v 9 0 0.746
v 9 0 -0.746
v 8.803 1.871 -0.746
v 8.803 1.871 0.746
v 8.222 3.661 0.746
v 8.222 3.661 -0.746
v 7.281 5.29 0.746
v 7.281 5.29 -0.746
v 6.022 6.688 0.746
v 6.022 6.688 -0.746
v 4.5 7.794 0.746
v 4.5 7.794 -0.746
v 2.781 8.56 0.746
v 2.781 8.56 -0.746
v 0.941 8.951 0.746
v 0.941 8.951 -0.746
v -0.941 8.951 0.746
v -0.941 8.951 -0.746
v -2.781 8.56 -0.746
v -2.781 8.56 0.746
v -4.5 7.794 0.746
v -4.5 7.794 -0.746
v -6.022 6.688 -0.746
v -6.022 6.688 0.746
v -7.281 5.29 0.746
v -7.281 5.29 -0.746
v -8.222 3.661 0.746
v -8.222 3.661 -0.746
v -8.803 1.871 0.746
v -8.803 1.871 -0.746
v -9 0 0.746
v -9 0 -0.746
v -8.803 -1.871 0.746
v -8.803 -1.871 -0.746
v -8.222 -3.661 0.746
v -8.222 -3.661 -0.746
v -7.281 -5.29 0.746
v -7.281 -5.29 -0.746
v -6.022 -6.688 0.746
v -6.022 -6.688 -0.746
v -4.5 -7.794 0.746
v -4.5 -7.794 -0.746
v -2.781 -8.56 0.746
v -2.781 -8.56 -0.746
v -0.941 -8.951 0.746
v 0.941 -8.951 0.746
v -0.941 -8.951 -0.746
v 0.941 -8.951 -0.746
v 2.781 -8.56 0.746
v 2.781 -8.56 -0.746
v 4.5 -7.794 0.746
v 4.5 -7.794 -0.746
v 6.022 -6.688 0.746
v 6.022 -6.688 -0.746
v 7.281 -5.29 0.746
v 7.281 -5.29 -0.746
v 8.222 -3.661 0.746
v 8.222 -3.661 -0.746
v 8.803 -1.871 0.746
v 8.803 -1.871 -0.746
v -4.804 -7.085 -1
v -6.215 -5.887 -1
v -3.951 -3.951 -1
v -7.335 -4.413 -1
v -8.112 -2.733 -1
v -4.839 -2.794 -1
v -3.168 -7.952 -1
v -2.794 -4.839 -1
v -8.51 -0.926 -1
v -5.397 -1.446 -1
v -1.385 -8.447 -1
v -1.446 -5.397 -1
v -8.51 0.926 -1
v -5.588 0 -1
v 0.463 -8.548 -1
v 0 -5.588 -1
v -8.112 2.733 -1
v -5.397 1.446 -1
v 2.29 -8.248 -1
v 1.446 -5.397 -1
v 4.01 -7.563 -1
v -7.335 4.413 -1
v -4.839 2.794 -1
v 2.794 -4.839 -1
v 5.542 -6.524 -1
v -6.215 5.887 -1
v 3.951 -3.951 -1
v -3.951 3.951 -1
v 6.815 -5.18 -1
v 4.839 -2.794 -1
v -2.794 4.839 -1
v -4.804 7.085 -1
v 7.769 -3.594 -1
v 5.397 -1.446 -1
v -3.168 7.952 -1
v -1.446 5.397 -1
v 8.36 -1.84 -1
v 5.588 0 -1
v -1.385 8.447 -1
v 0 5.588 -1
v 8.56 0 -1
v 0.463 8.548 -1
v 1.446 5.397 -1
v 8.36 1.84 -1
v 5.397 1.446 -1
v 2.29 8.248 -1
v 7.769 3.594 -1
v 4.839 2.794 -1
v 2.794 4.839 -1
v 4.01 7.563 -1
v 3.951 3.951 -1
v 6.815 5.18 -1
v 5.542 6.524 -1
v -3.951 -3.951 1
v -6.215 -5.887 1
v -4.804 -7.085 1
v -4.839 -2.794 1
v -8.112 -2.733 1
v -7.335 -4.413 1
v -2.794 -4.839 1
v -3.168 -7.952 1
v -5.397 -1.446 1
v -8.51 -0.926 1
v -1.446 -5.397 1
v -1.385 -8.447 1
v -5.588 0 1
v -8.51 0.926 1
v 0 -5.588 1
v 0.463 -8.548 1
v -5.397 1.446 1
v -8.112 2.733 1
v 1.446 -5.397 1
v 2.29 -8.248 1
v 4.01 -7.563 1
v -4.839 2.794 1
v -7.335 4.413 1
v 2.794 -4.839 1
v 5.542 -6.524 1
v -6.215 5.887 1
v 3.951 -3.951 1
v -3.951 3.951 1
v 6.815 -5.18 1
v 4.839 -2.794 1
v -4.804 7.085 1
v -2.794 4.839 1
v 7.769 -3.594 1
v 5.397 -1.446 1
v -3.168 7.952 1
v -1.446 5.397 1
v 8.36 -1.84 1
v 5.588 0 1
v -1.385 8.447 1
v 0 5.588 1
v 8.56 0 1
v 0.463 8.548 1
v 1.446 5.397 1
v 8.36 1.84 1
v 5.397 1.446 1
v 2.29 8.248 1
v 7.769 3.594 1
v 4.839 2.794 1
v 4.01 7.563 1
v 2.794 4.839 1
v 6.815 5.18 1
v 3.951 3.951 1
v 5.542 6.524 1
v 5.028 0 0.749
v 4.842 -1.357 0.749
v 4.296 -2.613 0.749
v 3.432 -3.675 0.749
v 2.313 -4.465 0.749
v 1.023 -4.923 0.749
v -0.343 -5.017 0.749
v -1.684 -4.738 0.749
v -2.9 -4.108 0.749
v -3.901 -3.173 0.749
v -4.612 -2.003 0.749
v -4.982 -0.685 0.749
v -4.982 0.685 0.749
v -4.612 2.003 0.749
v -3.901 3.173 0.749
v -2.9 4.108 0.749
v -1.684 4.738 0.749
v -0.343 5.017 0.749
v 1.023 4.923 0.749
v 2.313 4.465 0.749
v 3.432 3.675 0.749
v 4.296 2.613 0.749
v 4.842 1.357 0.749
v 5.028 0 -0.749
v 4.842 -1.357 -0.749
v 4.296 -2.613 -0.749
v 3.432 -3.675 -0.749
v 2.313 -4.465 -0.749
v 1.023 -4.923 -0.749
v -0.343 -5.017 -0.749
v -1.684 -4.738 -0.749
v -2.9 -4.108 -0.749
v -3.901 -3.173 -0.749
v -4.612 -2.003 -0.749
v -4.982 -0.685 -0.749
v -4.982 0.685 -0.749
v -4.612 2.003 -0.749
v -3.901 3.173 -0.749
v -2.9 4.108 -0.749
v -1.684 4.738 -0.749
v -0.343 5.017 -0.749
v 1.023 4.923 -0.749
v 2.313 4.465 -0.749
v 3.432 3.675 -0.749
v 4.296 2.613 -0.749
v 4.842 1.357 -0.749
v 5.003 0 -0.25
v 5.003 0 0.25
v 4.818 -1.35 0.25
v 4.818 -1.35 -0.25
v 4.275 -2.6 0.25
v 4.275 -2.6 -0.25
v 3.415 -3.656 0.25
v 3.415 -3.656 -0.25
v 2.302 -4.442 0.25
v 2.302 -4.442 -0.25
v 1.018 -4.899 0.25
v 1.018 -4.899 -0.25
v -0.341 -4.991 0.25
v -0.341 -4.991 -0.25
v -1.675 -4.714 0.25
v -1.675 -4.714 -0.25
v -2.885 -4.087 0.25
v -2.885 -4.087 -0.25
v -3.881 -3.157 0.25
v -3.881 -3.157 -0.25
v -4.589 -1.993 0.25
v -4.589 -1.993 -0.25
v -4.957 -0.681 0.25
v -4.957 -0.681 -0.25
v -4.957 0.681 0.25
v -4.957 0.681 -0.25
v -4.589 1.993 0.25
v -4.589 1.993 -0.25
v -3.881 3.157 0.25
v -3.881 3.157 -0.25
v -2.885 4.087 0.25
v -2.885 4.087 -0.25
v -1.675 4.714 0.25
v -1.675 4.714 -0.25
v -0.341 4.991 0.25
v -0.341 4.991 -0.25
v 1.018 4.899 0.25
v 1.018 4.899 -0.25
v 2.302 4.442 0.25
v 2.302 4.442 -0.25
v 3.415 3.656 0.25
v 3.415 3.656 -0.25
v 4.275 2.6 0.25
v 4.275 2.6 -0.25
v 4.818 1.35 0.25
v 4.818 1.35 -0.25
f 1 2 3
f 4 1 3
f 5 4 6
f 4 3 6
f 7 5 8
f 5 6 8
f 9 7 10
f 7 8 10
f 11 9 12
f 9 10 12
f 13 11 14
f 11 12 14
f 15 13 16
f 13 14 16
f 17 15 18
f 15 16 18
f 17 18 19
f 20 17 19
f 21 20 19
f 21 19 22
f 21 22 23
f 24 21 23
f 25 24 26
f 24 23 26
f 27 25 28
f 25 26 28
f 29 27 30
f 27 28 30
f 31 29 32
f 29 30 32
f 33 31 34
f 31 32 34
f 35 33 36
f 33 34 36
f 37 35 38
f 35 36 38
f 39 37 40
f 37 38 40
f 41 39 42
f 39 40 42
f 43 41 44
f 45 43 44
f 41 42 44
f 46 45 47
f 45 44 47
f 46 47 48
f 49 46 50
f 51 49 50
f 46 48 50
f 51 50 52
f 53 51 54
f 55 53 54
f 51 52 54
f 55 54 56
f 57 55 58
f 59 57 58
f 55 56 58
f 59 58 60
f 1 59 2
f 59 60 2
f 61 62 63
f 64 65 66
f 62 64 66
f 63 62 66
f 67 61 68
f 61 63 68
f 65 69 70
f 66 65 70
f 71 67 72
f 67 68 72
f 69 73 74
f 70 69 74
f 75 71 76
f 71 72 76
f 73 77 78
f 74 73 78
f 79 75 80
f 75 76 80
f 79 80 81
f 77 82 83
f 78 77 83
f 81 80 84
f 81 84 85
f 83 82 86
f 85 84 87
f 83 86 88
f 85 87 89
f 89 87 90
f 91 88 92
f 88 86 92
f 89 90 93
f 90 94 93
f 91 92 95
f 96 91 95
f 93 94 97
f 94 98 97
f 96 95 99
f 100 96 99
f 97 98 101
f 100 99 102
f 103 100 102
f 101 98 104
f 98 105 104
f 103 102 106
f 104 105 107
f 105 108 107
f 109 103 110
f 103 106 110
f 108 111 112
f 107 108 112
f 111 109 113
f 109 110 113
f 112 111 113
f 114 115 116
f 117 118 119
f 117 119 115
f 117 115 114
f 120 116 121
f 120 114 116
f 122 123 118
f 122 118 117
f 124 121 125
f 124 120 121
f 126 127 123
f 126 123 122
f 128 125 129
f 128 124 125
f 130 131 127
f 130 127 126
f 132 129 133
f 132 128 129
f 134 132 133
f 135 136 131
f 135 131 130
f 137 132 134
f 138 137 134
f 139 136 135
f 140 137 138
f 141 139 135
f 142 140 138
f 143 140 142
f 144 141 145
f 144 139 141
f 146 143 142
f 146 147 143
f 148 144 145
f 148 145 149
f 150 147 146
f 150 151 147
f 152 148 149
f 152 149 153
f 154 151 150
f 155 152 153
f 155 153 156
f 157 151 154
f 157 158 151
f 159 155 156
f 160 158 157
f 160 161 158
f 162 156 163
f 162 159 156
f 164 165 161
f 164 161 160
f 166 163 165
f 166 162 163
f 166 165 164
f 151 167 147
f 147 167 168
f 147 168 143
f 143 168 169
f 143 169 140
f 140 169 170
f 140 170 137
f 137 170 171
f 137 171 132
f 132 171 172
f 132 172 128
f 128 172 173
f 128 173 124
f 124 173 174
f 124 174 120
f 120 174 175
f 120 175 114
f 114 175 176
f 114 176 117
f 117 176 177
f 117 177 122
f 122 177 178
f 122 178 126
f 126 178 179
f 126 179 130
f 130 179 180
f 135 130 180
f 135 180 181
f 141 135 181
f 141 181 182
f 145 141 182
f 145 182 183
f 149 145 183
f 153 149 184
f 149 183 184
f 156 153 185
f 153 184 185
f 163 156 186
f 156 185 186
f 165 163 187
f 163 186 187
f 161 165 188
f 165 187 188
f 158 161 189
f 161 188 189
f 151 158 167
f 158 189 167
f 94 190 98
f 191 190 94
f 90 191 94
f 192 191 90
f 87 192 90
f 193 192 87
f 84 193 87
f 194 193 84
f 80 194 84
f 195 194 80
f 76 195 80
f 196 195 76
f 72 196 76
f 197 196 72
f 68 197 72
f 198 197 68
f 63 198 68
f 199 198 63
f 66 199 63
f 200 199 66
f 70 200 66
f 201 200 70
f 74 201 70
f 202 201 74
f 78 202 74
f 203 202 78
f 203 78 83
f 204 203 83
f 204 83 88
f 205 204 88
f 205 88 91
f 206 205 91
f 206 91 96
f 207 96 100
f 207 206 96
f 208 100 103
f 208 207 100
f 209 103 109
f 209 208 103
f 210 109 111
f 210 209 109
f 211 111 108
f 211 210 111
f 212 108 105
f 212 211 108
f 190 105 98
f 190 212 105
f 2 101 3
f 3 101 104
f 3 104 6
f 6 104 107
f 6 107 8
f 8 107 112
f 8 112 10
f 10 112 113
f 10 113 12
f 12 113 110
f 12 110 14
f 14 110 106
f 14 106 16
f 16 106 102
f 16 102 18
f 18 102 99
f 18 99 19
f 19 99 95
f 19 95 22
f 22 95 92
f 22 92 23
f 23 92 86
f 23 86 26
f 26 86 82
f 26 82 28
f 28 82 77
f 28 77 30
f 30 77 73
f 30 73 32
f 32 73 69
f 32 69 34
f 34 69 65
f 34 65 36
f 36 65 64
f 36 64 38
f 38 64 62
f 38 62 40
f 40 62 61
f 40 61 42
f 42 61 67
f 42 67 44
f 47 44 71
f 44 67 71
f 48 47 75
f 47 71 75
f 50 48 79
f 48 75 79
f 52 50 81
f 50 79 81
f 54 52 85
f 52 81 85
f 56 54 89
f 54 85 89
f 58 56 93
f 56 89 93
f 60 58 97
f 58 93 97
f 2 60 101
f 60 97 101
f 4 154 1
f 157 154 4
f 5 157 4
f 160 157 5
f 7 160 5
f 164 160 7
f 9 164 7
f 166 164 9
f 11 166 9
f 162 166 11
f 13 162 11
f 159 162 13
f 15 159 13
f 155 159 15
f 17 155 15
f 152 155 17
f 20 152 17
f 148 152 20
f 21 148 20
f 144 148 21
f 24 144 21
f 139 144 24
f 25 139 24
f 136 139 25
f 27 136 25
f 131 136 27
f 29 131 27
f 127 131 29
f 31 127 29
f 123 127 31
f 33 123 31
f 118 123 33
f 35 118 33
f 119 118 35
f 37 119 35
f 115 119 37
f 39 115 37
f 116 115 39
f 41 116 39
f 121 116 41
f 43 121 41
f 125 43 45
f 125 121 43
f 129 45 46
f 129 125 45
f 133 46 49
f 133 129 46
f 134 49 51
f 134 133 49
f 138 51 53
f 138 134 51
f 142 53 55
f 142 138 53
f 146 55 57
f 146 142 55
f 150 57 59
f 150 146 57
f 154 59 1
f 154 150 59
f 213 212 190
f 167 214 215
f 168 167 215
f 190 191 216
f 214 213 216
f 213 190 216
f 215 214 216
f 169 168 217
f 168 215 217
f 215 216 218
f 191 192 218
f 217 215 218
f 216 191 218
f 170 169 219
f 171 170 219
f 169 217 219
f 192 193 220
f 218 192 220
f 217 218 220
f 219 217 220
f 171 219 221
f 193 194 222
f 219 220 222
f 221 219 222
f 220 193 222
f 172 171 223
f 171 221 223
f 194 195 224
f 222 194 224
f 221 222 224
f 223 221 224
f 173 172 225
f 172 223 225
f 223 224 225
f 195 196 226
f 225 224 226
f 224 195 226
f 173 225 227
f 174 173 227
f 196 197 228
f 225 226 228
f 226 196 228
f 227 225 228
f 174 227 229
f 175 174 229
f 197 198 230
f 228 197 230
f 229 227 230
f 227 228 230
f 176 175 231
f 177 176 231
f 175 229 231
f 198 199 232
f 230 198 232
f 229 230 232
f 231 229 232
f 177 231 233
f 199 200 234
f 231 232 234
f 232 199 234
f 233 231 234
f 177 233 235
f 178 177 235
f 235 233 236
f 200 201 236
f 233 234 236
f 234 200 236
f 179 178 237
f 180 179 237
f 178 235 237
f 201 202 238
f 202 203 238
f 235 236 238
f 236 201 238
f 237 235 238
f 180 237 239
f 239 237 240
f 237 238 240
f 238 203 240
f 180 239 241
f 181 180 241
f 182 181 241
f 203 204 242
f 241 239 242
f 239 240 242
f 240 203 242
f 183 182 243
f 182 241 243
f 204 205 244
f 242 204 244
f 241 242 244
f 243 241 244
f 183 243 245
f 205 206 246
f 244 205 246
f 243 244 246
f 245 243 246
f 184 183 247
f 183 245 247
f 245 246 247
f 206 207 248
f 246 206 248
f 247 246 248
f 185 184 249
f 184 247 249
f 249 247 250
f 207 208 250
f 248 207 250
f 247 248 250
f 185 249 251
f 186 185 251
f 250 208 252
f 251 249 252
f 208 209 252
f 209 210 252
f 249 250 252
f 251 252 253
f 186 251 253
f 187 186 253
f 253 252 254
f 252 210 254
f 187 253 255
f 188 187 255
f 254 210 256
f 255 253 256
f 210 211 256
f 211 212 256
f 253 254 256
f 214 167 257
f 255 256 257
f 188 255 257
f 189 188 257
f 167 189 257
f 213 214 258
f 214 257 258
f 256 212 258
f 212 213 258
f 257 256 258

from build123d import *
from OCP.BRepFilletAPI import BRepFilletAPI_MakeChamfer

# Parameters (mm, degrees)
BOSS_EXTRUDE1_DEPTH      = 1
BOSS_EXTRUDE1_DEPTH_BACK = 1
SKETCH3_R                = 9
SKETCH3_R_2              = 5
CHAMFER1_SIZE            = 0.254
CHAMFER1_SIZE2           = 0.439940905
CHAMFER2_SIZE            = 0.536952942


with BuildPart() as part:
    # Sketch3 → Boss-Extrude1 (new, two sides: drawn at the far end of the back side and taken through both)
    with BuildSketch(Plane.XY.offset(-BOSS_EXTRUDE1_DEPTH_BACK)):
        Circle(SKETCH3_R)
        Circle(SKETCH3_R_2, mode=Mode.SUBTRACT)
    extrude(amount=BOSS_EXTRUDE1_DEPTH + BOSS_EXTRUDE1_DEPTH_BACK)

    # Chamfer1: one chamfer whose edges measure the first distance from different faces: ONE call of the kernel's chamfer builder (chamfer() names one face for all edges)
    chamfer1_edges_1 = [part.edges().sort_by_distance(p)[0] for p in [
        (-9, 0, 1),
    ]]
    chamfer1_side_1 = [part.faces().sort_by_distance(p)[0] for p in [
        (-9, 0, 0.5),
    ]]
    chamfer1_edges_2 = [part.edges().sort_by_distance(p)[0] for p in [
        (-9, 0, -1),
    ]]
    chamfer1_side_2 = [part.faces().sort_by_distance(p)[0] for p in [
        (-9, 0, -0.5),
    ]]
    chamfer1 = BRepFilletAPI_MakeChamfer(part.part.solid().wrapped)
    for e in chamfer1_edges_1:
        chamfer1.Add(CHAMFER1_SIZE, CHAMFER1_SIZE2, e.wrapped, chamfer1_side_1[0].wrapped)  # the first distance lies on this face
    for e in chamfer1_edges_2:
        chamfer1.Add(CHAMFER1_SIZE, CHAMFER1_SIZE2, e.wrapped, chamfer1_side_2[0].wrapped)  # the first distance lies on this face
    add(Compound.cast(chamfer1.Shape()), mode=Mode.REPLACE)

    # Sketch4 → Cut-Revolve1 (revolve, cut)
    with BuildSketch(Plane(origin=(0, 0, 0), x_dir=(0, 0, -1), z_dir=(1, 0, 0)), mode=Mode.PRIVATE) as cut_revolve1_sk:
        with BuildLine():
            Line((-1, 4.9492), (-1, 5.0508))
            ThreePointArc((-1, 5.0508), (0, 5), (1, 5.0508))
            Line((1, 5.0508), (1, 4.9492))
            Line((1, 4.9492), (-1, 4.9492))
        make_face()
    revolve(cut_revolve1_sk.sketch.rotate(Axis((0, 0, 1), (0, 0, -1)), 90), axis=Axis((0, 0, 1), (0, 0, -1)), mode=Mode.SUBTRACT)

    # Chamfer2
    # the kernel refuses this chamfer: 0.536952942, 0.254 mm, written as the material it takes off along each edge
    with BuildSketch(Plane(origin=(0, 0, -1), x_dir=(1, 0, 0), z_dir=(0, 1, 0))) as chamfer2_piece_1:
        with BuildLine():
            Line((5.0508 + CHAMFER2_SIZE, 0), (5.028453739, -0.251168371))
            ThreePointArc((5.028453739, -0.251168371), (5.038361074, -0.130738), (5.0508, 0))
            Line((5.0508, 0), (5.0508 + CHAMFER2_SIZE, 0))
        make_face()
    revolve(axis=Axis((0, 0, -1), (0, 0, -1)), mode=Mode.SUBTRACT)
    with BuildSketch(Plane(origin=(0, 0, 1), x_dir=(1, 0, 0), z_dir=(0, 1, 0))) as chamfer2_piece_2:
        with BuildLine():
            Line((5.0508 + CHAMFER2_SIZE, 0), (5.028453739, 0.251168371))
            ThreePointArc((5.028453739, 0.251168371), (5.038361074, 0.130738), (5.0508, 0))
            Line((5.0508, 0), (5.0508 + CHAMFER2_SIZE, 0))
        make_face()
    revolve(axis=Axis((0, 0, 1), (0, 0, -1)), mode=Mode.SUBTRACT)


solid = part.part
